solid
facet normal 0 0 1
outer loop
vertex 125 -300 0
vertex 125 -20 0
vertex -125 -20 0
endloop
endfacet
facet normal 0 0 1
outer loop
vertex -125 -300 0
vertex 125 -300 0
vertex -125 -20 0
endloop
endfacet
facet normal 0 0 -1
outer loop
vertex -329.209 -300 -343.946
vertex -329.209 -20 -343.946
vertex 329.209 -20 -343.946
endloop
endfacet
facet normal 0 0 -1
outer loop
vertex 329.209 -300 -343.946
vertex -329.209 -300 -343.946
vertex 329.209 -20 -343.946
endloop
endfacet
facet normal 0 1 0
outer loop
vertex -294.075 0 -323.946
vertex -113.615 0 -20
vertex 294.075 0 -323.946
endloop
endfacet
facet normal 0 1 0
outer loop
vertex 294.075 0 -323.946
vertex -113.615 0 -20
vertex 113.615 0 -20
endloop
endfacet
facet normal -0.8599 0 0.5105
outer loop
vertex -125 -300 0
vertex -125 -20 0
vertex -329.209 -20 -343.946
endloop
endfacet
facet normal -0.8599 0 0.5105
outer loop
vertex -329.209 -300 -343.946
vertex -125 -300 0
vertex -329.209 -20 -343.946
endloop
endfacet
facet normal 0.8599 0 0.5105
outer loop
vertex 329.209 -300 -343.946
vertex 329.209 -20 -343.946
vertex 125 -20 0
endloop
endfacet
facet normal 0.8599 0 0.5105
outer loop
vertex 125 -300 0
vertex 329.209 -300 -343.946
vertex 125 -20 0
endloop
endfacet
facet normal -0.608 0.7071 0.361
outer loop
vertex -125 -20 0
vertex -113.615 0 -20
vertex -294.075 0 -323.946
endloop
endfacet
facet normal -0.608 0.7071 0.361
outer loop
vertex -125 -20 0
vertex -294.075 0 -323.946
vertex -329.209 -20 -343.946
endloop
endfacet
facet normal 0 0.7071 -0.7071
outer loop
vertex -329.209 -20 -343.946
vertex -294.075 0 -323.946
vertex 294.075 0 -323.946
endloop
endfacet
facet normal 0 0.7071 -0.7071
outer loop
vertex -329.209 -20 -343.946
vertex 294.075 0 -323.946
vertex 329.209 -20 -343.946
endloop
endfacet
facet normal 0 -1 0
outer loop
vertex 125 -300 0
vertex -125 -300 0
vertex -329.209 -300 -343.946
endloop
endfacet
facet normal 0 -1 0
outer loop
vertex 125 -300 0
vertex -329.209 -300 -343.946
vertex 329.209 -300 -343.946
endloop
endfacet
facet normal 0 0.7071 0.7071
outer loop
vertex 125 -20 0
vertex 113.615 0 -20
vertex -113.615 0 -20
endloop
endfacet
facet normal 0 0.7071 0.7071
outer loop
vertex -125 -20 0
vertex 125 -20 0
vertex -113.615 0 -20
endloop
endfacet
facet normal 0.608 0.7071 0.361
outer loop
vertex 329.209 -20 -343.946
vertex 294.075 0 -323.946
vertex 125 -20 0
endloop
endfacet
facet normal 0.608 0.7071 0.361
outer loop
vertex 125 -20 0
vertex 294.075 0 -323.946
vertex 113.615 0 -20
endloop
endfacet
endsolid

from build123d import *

# Parameters (mm, degrees)
F1_DEPTH = 300
F2_SIZE  = 20


with BuildPart() as f1:
    # F0 (on Front) → F1 (new body)
    with BuildSketch(Plane.XZ):
        Polygon((0, -343.945524), (0, 0), (-125, 0), (-329.209394, -343.945524), align=None)
        Polygon((125, 0), (0, 0), (0, -343.945524), (329.209394, -343.945524), align=None)
    extrude(amount=F1_DEPTH)

    # F2
    f2_edges = [f1.edges().sort_by_distance(p)[0] for p in [
        (0, 0, -343.945524),
        (227.104697, 0, -171.972762),
        (0, 0, 0),
        (-227.104697, 0, -171.972762),
    ]]
    chamfer(f2_edges, length=F2_SIZE)


solid = f1.part
